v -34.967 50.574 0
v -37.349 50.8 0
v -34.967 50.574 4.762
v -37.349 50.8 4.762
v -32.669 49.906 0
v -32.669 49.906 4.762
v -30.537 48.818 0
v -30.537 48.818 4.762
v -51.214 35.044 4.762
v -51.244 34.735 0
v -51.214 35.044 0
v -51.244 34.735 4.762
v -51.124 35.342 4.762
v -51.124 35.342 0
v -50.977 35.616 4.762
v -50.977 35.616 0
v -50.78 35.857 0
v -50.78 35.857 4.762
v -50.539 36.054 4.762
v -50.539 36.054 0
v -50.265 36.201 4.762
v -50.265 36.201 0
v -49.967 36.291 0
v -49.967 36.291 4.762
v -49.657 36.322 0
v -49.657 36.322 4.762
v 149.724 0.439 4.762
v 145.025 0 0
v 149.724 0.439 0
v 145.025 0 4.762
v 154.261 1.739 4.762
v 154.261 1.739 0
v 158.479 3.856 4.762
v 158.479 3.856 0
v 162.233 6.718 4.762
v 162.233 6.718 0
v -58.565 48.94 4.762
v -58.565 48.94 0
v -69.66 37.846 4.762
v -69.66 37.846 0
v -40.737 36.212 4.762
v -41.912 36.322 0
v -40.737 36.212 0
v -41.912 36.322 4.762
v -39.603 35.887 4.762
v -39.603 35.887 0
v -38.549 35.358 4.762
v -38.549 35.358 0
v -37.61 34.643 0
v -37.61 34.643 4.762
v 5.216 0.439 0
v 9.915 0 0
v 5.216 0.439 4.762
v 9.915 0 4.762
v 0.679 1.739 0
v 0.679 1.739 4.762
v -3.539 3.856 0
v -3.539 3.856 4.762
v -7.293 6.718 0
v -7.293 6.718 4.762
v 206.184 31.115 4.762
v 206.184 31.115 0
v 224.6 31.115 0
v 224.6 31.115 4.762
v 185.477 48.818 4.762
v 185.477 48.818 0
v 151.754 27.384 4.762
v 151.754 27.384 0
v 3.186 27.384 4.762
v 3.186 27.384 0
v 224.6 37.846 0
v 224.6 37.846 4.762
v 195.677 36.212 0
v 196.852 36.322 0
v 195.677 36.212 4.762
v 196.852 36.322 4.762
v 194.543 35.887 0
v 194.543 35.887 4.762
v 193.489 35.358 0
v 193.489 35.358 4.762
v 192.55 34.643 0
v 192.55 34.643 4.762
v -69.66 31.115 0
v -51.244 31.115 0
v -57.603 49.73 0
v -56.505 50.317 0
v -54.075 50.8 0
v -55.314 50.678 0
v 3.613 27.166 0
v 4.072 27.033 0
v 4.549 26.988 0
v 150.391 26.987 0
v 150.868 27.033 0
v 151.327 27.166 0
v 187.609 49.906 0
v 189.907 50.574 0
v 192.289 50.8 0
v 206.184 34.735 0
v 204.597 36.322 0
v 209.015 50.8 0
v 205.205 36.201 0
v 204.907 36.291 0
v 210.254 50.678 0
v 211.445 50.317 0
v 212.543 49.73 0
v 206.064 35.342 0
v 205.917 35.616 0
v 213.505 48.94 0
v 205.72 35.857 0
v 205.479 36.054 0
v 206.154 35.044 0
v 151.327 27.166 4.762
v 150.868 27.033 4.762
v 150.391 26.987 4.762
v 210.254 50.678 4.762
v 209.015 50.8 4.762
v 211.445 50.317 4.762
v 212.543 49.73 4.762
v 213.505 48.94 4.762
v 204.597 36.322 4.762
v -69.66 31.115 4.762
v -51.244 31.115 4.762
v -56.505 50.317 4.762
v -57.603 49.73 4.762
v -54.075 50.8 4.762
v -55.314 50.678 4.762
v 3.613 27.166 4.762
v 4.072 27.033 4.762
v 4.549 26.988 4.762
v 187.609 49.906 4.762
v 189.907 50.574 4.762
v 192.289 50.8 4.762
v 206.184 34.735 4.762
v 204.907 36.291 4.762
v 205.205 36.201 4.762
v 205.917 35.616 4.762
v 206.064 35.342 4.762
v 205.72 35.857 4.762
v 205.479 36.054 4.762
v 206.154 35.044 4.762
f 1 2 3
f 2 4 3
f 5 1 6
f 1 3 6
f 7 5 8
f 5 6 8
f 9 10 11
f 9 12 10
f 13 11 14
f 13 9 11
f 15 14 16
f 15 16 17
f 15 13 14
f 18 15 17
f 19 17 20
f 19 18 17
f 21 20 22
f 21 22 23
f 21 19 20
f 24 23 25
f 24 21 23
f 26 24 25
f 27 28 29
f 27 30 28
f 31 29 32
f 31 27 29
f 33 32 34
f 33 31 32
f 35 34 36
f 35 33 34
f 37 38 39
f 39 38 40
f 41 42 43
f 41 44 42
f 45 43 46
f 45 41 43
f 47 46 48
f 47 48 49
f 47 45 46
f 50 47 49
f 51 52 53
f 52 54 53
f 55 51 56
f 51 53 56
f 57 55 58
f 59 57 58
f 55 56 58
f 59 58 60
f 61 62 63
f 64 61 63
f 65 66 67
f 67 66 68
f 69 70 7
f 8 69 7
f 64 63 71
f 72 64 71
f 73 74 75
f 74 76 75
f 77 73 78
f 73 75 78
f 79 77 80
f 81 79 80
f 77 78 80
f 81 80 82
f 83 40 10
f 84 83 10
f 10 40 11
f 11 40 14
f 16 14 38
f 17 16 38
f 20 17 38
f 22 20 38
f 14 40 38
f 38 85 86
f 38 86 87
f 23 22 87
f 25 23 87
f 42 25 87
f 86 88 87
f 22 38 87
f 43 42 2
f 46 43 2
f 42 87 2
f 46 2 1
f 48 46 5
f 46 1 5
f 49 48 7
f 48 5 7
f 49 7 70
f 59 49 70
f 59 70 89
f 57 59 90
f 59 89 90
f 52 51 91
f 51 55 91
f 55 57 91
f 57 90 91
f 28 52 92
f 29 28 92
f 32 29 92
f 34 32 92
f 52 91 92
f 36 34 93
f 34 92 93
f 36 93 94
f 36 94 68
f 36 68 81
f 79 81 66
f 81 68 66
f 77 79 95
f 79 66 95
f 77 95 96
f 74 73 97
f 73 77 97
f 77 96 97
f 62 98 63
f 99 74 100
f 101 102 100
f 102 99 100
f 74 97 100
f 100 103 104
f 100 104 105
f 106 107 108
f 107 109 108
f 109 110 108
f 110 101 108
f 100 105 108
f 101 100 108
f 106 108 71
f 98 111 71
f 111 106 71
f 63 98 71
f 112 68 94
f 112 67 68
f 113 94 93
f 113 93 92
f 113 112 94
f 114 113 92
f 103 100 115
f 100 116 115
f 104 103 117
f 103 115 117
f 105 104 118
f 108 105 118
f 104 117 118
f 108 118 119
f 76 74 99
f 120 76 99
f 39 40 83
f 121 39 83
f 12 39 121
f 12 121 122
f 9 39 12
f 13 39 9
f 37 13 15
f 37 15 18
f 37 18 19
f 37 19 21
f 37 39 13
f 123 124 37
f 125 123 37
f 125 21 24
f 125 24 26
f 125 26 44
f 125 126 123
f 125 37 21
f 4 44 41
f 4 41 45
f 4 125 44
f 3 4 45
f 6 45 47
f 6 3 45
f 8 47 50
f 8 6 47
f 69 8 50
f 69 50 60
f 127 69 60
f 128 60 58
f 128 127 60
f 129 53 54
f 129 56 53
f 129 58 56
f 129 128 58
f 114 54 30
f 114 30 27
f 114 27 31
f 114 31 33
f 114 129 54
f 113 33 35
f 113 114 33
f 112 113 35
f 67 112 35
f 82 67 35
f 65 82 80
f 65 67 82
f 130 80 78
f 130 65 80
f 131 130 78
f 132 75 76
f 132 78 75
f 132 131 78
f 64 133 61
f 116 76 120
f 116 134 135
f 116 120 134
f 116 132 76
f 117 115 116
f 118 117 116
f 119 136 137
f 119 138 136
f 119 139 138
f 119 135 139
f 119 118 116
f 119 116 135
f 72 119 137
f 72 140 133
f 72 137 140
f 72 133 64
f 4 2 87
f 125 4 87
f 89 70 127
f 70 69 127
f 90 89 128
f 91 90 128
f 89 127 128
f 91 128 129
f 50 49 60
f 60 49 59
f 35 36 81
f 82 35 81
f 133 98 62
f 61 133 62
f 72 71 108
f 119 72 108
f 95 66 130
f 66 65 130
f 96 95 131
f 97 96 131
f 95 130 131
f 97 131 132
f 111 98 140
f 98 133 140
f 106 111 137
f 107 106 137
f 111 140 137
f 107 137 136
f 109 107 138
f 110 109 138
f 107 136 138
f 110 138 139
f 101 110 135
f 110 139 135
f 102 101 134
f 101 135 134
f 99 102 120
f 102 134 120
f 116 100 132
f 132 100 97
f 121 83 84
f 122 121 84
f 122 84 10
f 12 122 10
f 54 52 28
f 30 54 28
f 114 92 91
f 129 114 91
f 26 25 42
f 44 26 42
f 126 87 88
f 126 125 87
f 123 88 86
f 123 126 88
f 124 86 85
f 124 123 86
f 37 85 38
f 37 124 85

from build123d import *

# Parameters (mm, degrees)
BOSS_EXTRUDE1_DEPTH = 4.7625
F_1_0_RADIUS_R      = 25.4
F_0_1_RADIUS_R      = 2.54
F_0_25_RADIUS_R     = 6.35
F_0_5_RADIUS_R      = 12.7
F_0_0625_RADIUS_R   = 1.5875


with BuildPart() as part:
    # Sketch1 → Boss-Extrude1 (new body)
    with BuildSketch(Plane.XY):
        Polygon((0, 0), (154.94, 0), (194.3735, 36.322), (206.1845, 36.322), (206.1845, 31.115), (224.5995, 31.115), (224.5995, 37.846), (211.6455, 50.8), (188.595, 50.8), (151.13, 26.9875), (3.81, 26.9875), (-33.655, 50.8), (-56.7055, 50.8), (-69.6595, 37.846), (-69.6595, 36.322), (-69.6595, 31.115), (-51.2445, 31.115), (-51.2445, 36.322), (-39.4335, 36.322), align=None)
    extrude(amount=BOSS_EXTRUDE1_DEPTH)

    # 1.0 Radius
    f_1_0_radius_edges = [part.edges().sort_by_distance(p)[0] for p in [
        (154.94, 0, 2.38125),
        (0, 0, 2.38125),
    ]]
    fillet(f_1_0_radius_edges, radius=F_1_0_RADIUS_R)

    # 0.1 Radius
    f_0_1_radius_edges = [part.edges().sort_by_distance(p)[0] for p in [
        (3.81, 26.9875, 2.38125),
        (151.13, 26.9875, 2.38125),
    ]]
    fillet(f_0_1_radius_edges, radius=F_0_1_RADIUS_R)

    # 0.25 Radius
    f_0_25_radius_edges = [part.edges().sort_by_distance(p)[0] for p in [
        (211.6455, 50.8, 2.38125),
        (194.3735, 36.322, 2.38125),
        (-39.4335, 36.322, 2.38125),
        (-56.7055, 50.8, 2.38125),
    ]]
    fillet(f_0_25_radius_edges, radius=F_0_25_RADIUS_R)

    # 0.5 Radius
    f_0_5_radius_edges = [part.edges().sort_by_distance(p)[0] for p in [
        (188.595, 50.8, 2.38125),
        (-33.655, 50.8, 2.38125),
    ]]
    fillet(f_0_5_radius_edges, radius=F_0_5_RADIUS_R)

    # 0.0625 Radius
    f_0_0625_radius_edges = [part.edges().sort_by_distance(p)[0] for p in [
        (206.1845, 36.322, 2.38125),
        (-51.2445, 36.322, 2.38125),
    ]]
    fillet(f_0_0625_radius_edges, radius=F_0_0625_RADIUS_R)


solid = part.part
